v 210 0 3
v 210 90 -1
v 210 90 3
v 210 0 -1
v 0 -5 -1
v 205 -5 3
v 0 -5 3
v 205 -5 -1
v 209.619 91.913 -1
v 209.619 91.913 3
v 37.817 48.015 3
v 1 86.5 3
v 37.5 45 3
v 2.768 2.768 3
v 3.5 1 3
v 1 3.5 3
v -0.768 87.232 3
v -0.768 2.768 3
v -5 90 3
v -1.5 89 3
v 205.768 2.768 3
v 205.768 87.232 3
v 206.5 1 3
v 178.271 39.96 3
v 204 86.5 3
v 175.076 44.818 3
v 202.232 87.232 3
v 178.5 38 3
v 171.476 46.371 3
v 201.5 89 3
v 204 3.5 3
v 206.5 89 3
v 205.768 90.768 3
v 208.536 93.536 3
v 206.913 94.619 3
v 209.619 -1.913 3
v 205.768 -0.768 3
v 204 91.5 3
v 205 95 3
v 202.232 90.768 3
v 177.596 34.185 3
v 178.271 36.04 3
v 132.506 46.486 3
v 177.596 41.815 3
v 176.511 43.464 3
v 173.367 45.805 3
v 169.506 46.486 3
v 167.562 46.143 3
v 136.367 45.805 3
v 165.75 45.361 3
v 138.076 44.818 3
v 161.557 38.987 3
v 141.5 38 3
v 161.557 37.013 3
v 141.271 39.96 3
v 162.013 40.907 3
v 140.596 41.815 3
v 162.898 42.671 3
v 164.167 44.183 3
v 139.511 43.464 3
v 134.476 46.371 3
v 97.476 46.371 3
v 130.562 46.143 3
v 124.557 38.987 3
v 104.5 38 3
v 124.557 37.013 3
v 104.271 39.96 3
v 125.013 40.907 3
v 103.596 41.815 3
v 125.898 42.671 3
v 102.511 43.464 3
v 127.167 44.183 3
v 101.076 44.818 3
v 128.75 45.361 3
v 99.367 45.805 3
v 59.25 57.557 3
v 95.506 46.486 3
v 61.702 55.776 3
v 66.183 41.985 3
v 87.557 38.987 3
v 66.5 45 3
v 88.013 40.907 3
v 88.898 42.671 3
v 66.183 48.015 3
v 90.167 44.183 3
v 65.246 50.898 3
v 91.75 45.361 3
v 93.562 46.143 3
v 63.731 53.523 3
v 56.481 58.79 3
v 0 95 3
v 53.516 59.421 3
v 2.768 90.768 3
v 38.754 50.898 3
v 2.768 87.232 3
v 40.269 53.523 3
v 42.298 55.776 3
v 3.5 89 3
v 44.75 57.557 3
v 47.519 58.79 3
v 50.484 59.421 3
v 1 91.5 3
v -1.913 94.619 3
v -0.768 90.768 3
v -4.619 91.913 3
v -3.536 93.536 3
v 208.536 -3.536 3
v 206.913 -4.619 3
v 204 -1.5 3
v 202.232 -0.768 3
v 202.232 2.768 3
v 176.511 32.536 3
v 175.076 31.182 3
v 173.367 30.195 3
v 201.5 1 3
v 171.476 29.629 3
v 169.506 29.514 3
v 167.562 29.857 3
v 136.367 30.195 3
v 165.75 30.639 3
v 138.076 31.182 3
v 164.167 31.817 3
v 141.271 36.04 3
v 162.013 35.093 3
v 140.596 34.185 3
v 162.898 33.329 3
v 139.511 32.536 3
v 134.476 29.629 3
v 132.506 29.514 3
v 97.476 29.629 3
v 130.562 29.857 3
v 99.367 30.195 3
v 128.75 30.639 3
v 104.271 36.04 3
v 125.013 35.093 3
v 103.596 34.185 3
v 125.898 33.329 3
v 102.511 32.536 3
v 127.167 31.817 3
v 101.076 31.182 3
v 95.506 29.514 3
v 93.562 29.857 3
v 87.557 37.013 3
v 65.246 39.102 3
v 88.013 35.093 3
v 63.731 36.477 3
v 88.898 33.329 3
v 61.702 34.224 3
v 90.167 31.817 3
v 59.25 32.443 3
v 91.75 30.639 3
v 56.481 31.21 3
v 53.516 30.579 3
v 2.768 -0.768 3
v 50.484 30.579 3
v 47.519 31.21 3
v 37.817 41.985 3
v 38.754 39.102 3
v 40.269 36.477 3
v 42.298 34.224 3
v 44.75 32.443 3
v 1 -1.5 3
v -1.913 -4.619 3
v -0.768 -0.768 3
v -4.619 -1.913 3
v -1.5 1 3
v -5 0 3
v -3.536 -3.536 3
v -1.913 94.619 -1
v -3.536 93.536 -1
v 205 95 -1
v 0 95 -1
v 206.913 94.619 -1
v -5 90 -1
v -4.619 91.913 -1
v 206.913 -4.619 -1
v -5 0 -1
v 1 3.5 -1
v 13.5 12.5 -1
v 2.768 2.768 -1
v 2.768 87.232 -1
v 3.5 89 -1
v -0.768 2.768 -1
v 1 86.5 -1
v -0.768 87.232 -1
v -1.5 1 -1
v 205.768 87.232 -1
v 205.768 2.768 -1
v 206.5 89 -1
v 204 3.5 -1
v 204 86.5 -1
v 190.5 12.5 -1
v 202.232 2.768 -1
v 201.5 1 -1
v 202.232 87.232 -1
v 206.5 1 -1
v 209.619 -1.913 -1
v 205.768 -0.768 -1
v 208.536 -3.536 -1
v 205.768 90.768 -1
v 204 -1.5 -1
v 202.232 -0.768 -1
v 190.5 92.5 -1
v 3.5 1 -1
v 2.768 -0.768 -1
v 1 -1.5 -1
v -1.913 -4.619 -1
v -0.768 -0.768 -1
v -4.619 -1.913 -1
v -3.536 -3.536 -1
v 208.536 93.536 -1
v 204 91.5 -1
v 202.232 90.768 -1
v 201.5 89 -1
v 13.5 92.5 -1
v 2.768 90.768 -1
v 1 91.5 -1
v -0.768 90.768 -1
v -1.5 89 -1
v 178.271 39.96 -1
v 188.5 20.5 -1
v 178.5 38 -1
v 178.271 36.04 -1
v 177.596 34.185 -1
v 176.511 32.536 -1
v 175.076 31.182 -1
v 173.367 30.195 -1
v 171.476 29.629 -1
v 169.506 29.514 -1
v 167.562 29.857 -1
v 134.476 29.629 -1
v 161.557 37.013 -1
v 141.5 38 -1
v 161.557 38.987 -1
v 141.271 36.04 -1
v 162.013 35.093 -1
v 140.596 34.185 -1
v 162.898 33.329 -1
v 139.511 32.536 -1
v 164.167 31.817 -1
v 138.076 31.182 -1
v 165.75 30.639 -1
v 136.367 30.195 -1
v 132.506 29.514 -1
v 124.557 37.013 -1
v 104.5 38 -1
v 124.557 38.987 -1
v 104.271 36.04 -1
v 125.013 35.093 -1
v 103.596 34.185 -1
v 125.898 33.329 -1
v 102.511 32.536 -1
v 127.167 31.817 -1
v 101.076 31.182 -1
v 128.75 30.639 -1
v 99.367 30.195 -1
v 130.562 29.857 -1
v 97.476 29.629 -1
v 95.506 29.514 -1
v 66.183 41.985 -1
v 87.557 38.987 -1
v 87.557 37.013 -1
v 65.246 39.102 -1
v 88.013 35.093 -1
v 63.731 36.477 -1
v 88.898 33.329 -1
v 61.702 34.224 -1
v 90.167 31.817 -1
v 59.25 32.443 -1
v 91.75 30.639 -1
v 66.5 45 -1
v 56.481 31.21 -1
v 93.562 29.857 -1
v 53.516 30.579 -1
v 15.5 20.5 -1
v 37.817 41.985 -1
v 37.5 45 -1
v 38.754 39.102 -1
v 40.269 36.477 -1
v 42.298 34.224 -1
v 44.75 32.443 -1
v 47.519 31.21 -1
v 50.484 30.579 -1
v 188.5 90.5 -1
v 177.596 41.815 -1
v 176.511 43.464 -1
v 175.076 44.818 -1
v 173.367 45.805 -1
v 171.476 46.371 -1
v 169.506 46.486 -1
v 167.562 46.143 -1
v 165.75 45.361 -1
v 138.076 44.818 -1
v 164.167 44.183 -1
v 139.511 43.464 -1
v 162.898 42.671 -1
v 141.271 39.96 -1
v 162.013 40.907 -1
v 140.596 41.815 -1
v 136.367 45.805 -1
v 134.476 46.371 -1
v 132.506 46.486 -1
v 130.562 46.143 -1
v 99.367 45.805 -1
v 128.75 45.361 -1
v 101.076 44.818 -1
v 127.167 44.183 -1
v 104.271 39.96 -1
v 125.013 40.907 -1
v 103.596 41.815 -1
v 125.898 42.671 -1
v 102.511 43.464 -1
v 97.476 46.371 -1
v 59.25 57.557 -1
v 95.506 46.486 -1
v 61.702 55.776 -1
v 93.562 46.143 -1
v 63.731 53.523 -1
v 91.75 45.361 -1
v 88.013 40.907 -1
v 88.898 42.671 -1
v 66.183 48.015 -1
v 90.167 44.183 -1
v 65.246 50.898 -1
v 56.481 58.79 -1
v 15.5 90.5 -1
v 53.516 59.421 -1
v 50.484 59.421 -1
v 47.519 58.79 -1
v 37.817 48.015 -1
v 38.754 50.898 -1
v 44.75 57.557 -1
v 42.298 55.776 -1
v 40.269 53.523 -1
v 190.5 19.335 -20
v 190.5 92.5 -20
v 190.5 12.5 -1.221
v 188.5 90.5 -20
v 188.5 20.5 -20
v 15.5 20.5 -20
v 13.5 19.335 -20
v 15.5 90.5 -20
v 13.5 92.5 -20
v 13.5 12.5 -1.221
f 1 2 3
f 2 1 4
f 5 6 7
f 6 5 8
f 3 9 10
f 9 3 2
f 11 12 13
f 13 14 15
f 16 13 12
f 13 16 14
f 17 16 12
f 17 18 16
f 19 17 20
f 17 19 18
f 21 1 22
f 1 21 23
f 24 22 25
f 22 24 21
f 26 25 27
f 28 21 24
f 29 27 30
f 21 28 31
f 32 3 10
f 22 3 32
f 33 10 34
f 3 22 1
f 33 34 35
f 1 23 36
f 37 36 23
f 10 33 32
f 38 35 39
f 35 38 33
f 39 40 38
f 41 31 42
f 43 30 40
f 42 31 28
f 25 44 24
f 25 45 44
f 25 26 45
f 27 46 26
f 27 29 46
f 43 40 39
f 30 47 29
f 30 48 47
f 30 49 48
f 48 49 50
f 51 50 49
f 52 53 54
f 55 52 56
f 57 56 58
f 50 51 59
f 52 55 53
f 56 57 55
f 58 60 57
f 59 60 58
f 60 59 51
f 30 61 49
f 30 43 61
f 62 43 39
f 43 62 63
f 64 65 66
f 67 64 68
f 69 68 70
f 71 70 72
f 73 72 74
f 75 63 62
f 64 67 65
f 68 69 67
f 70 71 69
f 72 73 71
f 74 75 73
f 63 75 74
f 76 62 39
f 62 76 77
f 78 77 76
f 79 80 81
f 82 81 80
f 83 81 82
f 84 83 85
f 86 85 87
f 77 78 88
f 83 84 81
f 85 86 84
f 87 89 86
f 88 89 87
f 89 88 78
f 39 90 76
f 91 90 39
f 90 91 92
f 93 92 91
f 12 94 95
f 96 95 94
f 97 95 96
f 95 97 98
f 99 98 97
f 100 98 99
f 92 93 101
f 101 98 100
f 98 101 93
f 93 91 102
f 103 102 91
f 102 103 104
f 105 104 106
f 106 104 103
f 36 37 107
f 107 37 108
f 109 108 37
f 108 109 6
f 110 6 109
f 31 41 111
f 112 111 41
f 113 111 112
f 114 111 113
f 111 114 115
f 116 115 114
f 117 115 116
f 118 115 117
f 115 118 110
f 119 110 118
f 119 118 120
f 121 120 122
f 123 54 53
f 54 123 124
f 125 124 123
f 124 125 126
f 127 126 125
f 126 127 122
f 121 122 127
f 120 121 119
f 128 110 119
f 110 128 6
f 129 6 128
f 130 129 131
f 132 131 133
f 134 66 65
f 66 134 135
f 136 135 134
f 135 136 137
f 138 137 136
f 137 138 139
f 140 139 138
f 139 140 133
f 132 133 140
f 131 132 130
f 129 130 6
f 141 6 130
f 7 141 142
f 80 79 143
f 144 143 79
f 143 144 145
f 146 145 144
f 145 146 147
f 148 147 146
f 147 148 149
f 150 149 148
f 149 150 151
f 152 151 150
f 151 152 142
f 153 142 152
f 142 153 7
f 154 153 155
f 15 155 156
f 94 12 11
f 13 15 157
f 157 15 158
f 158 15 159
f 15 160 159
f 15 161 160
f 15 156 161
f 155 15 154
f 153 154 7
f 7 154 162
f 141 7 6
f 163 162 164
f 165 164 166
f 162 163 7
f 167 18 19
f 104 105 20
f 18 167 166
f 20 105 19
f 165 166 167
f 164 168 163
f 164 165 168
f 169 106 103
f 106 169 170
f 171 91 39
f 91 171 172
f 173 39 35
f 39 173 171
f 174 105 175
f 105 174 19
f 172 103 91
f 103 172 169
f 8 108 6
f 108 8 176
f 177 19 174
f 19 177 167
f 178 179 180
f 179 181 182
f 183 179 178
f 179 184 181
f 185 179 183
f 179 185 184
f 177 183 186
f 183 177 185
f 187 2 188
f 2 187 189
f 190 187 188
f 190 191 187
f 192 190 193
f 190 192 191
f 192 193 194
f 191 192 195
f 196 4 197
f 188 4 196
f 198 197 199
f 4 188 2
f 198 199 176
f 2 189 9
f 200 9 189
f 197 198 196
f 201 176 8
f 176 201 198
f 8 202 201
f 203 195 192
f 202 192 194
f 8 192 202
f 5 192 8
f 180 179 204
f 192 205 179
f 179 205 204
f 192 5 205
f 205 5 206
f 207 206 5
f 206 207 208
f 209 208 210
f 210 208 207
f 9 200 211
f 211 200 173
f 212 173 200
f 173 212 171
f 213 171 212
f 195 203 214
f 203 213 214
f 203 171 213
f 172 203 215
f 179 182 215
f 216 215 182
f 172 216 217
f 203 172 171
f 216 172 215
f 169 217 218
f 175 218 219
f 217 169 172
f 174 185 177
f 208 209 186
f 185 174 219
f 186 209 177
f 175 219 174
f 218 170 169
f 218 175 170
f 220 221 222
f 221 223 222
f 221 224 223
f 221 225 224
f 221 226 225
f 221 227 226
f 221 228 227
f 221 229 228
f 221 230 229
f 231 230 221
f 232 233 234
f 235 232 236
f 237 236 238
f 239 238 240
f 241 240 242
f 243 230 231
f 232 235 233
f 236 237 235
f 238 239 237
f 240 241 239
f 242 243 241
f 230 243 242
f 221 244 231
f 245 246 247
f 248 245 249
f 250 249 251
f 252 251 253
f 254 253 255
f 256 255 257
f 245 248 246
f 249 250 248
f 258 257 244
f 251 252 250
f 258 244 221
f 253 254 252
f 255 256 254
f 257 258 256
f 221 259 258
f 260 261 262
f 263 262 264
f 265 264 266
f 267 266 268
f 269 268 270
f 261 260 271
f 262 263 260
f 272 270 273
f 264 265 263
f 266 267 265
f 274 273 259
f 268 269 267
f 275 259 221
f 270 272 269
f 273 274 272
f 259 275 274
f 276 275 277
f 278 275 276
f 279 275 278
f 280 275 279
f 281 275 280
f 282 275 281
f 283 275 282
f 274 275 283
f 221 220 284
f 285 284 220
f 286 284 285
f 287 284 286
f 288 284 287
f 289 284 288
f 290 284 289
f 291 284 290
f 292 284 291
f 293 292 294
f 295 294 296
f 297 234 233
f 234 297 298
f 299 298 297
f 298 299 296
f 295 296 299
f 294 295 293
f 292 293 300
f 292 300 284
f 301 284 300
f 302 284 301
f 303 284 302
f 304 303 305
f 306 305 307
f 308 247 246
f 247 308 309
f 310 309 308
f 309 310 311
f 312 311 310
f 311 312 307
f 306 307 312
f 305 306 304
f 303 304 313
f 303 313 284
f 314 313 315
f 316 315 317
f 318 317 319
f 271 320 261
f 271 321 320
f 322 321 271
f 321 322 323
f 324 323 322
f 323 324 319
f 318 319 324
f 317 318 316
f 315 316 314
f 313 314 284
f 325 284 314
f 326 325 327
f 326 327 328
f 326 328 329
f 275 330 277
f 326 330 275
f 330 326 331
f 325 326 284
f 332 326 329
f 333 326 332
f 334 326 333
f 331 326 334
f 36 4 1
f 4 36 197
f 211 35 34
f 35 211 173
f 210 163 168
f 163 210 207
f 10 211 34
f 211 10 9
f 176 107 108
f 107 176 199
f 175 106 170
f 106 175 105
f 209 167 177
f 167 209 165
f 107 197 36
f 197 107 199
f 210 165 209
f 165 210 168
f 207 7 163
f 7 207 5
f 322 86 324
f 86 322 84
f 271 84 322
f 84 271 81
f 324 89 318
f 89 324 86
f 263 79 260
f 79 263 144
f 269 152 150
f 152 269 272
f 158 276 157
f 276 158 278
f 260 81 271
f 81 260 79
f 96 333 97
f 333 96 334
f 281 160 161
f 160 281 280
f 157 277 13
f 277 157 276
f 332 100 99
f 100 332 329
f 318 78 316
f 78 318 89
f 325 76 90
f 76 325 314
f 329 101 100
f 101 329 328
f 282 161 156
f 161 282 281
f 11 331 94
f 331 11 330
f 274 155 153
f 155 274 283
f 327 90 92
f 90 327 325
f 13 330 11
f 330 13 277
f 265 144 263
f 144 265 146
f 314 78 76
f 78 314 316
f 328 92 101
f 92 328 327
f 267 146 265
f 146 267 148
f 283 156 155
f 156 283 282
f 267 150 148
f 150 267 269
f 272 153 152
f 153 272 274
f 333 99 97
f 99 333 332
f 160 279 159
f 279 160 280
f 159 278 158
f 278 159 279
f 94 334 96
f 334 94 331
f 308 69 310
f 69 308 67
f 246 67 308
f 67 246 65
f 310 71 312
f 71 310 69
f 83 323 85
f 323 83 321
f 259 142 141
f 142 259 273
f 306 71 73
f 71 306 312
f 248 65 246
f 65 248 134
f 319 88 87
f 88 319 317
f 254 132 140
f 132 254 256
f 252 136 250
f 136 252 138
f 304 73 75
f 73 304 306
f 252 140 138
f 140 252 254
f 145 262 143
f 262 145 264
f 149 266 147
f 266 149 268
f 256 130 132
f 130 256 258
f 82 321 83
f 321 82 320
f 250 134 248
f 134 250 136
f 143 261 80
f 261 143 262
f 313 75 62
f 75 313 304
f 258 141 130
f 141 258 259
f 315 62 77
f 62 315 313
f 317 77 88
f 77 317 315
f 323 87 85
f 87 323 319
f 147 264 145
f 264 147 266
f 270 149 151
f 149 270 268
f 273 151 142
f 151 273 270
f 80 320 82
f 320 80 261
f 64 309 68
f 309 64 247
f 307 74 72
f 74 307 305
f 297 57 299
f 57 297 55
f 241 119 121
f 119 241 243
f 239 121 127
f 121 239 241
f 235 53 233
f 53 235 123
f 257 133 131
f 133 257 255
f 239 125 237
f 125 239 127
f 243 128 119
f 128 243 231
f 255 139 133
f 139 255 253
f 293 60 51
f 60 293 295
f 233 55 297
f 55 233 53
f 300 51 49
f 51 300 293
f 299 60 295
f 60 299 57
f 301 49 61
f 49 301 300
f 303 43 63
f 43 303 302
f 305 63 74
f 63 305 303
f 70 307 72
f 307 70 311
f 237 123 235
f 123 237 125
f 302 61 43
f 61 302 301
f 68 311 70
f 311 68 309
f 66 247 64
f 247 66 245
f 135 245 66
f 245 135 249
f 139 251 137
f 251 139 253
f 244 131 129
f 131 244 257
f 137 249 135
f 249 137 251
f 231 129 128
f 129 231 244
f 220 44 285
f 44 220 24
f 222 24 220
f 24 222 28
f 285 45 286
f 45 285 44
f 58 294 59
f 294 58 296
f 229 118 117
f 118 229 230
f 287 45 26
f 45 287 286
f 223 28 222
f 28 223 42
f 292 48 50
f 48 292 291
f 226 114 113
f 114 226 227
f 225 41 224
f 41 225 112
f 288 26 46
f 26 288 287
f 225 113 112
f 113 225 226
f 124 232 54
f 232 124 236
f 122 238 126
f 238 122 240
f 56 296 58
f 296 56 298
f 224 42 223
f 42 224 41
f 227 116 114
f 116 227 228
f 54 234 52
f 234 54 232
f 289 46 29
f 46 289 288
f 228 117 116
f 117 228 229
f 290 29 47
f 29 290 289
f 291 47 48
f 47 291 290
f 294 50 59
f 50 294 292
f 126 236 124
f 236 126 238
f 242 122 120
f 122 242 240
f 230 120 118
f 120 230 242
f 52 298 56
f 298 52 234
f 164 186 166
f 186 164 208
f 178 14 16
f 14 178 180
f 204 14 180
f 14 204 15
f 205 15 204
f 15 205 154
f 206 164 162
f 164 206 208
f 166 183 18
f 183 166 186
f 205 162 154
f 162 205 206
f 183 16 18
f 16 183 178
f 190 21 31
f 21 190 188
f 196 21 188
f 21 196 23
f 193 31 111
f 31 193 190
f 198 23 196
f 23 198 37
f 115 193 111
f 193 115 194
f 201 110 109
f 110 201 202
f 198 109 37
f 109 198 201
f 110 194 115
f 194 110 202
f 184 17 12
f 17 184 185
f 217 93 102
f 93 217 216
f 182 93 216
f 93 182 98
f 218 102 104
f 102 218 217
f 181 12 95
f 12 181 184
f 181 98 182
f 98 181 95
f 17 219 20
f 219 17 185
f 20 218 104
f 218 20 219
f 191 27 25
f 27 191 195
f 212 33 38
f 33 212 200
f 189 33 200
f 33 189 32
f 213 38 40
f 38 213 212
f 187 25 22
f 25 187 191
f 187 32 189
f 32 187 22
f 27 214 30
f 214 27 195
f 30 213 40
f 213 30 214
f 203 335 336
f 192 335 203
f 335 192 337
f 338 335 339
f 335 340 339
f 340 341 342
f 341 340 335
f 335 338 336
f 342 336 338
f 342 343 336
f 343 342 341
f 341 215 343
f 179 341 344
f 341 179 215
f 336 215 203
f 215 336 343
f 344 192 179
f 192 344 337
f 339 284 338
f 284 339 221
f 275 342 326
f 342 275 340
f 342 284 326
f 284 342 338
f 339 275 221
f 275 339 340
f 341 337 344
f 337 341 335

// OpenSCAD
// Box to fit some controls into an odd space in a kayak (lid)

LidWidth = 210;
LidDepth = 95;
LidHeight = 2;
CornerRad = 5;
CornerHoleOffset = 6;
MountHole = 5 / 2;

//rotate(a=[0,180,0])
difference(){
    // Rounded corners
    minkowski(){
        cube([
            LidWidth - CornerRad,
            LidDepth - CornerRad,
            LidHeight]);
        cylinder(
            r=CornerRad,
            h=LidHeight,
            center=true);
    };
    
    // Big Hole
    translate([52, 45, -1])
        cylinder(r=14.5, h=LidHeight + 2);
    
    // 3 Smaller Holes
    translate([96, 38, -1])
        cylinder(r=8.5, h=LidHeight + 2);
    translate([133, 38, -1])
        cylinder(r=8.5, h=LidHeight + 2);
    translate([170, 38, -1])
        cylinder(r=8.5, h=LidHeight + 2);
    
    // Mounting Holes
    translate([1, 1, -1])
        cylinder(r=MountHole, h=LidHeight + 2);
    translate([LidWidth - 6, 1, -1])
        cylinder(r=MountHole, h=LidHeight + 2);
    translate([1, LidDepth - 6, -1])
        cylinder(r=MountHole, h=LidHeight + 2);
    translate([LidWidth - 6, LidDepth - 6, -1])
        cylinder(r=MountHole, h=LidHeight + 2);    
}

// Flange
translate([13.5, LidDepth - 82.5, -20]){
    difference(){
        cube([177, 80, 20]);
        translate([2, 8, 0])
            cube([173, 70, 20]);
        translate([0, -21, 18])
            rotate([-70, 0, 0])
                cube([179, 40, 20]);
    }
}
